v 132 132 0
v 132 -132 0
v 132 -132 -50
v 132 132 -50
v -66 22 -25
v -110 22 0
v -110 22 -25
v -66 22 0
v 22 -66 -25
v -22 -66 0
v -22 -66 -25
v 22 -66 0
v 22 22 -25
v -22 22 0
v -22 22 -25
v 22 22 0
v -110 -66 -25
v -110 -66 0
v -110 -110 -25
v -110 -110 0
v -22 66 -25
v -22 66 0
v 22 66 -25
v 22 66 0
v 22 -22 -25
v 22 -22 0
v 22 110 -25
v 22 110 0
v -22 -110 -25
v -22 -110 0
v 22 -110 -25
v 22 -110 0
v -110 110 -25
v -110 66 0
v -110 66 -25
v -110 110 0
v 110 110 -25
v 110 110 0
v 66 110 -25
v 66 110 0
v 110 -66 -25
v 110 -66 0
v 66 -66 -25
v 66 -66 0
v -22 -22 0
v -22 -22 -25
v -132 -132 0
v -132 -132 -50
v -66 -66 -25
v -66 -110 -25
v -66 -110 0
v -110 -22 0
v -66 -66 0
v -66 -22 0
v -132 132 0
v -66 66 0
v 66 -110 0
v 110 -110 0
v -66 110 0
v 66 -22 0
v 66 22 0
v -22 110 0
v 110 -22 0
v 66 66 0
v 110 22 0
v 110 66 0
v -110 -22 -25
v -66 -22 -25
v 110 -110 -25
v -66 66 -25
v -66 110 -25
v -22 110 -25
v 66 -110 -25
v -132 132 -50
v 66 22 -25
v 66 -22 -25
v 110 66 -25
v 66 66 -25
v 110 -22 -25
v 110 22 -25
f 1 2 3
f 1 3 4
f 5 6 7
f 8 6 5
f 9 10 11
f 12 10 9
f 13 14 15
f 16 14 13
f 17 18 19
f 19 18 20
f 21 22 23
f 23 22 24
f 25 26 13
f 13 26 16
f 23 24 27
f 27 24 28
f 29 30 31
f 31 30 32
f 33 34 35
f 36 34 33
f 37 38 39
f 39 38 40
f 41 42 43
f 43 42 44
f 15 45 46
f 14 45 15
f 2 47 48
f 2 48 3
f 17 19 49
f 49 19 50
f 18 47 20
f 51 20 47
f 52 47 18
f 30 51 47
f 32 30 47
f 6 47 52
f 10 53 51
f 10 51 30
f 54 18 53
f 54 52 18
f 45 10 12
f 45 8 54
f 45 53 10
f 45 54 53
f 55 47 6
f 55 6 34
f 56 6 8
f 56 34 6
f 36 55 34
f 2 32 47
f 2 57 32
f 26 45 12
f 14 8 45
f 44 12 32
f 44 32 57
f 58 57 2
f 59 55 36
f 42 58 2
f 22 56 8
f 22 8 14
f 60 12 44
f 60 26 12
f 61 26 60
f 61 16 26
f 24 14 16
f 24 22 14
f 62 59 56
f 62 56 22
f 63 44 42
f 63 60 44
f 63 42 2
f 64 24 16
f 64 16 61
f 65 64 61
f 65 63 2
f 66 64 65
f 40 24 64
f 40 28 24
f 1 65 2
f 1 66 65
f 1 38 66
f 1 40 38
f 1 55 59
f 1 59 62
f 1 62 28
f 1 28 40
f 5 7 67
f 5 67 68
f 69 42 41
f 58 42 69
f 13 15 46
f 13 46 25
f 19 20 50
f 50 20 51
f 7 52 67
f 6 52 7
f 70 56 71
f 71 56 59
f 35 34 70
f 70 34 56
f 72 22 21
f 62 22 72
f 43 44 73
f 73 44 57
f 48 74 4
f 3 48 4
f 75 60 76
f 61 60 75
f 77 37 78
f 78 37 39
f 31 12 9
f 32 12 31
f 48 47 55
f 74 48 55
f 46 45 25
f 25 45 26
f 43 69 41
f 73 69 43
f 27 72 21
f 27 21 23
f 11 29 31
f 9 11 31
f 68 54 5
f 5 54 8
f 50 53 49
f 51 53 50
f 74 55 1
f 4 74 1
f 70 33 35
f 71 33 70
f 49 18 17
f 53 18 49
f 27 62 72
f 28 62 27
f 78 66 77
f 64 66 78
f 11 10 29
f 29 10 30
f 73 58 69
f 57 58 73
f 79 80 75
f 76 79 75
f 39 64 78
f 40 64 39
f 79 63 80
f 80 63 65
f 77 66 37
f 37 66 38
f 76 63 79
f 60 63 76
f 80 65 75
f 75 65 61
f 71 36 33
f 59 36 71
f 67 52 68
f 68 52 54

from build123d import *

# Parameters (mm, degrees)
F0_W     = 44
F0_H     = 44
F1_DEPTH = 25
F0_W_2   = 264
F0_H_2   = 264
F4_DEPTH = 50


with BuildPart() as f1:
    # F0 (on Top) → F1 (new body)
    with BuildSketch(Plane.XY):
        with Locations((-88, 0)):
            Rectangle(F0_W, F0_H)
        with Locations((-88, 88)):
            Rectangle(F0_W, F0_H)
        with Locations((0, 88)):
            Rectangle(F0_W, F0_H)
        Rectangle(F0_W, F0_H)
    extrude(amount=-F1_DEPTH)


with BuildPart() as f2_1:
    # F2: instance of F1
    add(f1.part.mirror(Plane.YZ))


with BuildPart() as f3_1:
    # F3: instance of F1
    add(f1.part.mirror(Plane.XZ))


with BuildPart() as f3_2:
    # F3: instance of F2_1
    add(f2_1.part.mirror(Plane.XZ))


with BuildPart() as f4:
    # F0 (on Top) → F4 (new body)
    with BuildSketch(Plane.XY):
        Rectangle(F0_W_2, F0_H_2)
        with Locations((-88, 0)):
            Rectangle(F0_W, F0_H, mode=Mode.SUBTRACT)
        with Locations((-88, 88)):
            Rectangle(F0_W, F0_H, mode=Mode.SUBTRACT)
        Rectangle(F0_W, F0_H, mode=Mode.SUBTRACT)
        with Locations((0, 88)):
            Rectangle(F0_W, F0_H, mode=Mode.SUBTRACT)
        with Locations((-88, 0)):
            Rectangle(F0_W, F0_H)
        Rectangle(F0_W, F0_H)
        with Locations((-88, 88)):
            Rectangle(F0_W, F0_H)
        with Locations((0, 88)):
            Rectangle(F0_W, F0_H)
    extrude(amount=-F4_DEPTH)

    # F5: cut F1, F2_1, F3_1, F3_2
    add(f1.part, mode=Mode.SUBTRACT)
    add(f2_1.part, mode=Mode.SUBTRACT)
    add(f3_1.part, mode=Mode.SUBTRACT)
    add(f3_2.part, mode=Mode.SUBTRACT)


solid = f4.part
